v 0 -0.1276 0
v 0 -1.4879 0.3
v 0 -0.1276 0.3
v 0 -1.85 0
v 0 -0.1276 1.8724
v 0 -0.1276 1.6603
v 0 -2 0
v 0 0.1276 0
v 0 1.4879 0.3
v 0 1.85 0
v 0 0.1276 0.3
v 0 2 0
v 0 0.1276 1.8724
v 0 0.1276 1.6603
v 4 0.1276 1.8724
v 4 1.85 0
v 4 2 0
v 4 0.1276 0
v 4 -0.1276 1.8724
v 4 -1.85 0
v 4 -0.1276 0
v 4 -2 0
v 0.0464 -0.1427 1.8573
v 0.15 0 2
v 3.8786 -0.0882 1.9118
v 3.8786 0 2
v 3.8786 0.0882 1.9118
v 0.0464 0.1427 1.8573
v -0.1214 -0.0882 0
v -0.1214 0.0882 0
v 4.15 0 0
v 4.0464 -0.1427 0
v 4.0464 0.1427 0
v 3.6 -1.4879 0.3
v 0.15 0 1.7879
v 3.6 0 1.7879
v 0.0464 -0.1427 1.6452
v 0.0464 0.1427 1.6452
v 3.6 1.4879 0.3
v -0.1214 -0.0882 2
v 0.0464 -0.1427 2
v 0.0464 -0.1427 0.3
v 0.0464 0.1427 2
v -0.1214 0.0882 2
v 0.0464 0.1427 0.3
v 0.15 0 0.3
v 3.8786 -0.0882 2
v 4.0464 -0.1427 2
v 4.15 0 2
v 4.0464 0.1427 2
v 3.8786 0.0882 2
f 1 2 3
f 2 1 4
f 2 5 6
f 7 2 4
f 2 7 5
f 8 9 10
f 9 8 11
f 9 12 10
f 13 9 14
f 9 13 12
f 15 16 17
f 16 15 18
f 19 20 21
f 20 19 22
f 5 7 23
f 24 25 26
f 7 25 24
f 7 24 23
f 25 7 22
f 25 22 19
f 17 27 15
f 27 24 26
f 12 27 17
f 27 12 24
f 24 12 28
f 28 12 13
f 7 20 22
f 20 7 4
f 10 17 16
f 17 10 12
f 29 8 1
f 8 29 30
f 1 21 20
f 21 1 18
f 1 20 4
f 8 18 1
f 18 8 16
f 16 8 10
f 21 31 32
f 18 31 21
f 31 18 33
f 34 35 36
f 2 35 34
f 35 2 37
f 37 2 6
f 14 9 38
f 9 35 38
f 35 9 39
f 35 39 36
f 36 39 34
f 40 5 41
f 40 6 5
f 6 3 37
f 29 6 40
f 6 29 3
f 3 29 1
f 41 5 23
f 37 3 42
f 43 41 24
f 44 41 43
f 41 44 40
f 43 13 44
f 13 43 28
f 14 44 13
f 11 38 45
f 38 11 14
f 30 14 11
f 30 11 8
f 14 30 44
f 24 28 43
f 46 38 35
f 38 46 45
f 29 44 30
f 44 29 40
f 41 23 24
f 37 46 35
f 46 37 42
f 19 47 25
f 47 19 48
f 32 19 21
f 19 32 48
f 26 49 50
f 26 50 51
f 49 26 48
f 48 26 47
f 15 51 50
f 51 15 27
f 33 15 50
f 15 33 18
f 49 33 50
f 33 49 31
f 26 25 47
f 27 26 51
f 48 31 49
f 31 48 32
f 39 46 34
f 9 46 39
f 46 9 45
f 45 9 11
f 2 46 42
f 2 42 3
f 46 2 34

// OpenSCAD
// tents.scad
// OpenSCAD Template
// 
// Copyright (C) 2013 Christopher Roberts
//
// This program is free software: you can redistribute it and/or modify
// it under the terms of the GNU General Public License as published by
// the Free Software Foundation, either version 3 of the License, or
// (at your option) any later version.
// 
// This program is distributed in the hope that it will be useful,
// but WITHOUT ANY WARRANTY; without even the implied warranty of
// MERCHANTABILITY or FITNESS FOR A PARTICULAR PURPOSE.  See the
// GNU General Public License for more details.
// 
// You should have received a copy of the GNU General Public License
// along with this program.  If not, see <http://www.gnu.org/licenses/>.


// Global Parameters
height = 2; // Height of tent pole
length = 4; // Length of tent
layer  = 0.3; // Layer height

module tent_shape( l, h) {

    difference() {

        // Things that exist
        union() {
            translate( v = [ 0, 0, -height ] ) {
                rotate( a = [ 45, 0, 0 ] ) {
                    cube( size = [l, sqrt(0.5 * pow(h*2,2)), sqrt(0.5 * pow(h*2,2)) ] );
                }
            }
        }

        // Things to be cut out
        union() {
            translate( v = [ -0.1, -h, -h] ) {
                cube( size = [ length + 0.2, 2* height, height ] );
            }
        }
    }

}

module tent() {

    difference() {

        // Things that exist
        union() {
            tent_shape(length, height);
        }

        // Things that don't exist
        union() {
            translate( v = [ -0.1, 0, -sqrt( 0.5 * pow(layer,2)) ] ) {
                tent_shape(length -layer, height);
            }
        }
    
    }

}

module tent_complete() {

    difference() {

        // Things that exist
        union() {
            tent();
            cylinder( r = layer/2, h = height );
            translate( v = [ length, 0, 0 ] ) {
                cylinder( r = layer/2, h = height );
            }
            translate( v = [0, -height +layer, 0] ) {
                cube( size = [length, 2 * (height - layer), layer ] );
            }
            translate( v = [0, -height + layer/2, 0] ) {
                cube( size = [length, 2 * height - layer, layer/2 ] );
            }

        }

        // Things that don't exist
        union() {

        }
    
    }

}

tent_complete();

// -------------------------------------------------------------------------------------------
// Commands
// -------------------------------------------------------------------------------------------

// http://en.wikibooks.org/wiki/OpenSCAD_User_Manual

// primitives
// cube(size = [1,2,3], center = true);
// sphere( r = 10, $fn=100 );
// circle( r = 10 );
// cylinder( h = 10, r = 20, $fs = 6, center = true );
// cylinder( h = 10, r1 = 10, r2 = 20, $fs = 6, center = false );
// polyhedron(points = [ [x, y, z], ... ], triangles = [ [p1, p2, p3..], ... ], convexity = N);
// polygon(points = [ [x, y], ... ], paths = [ [p1, p2, p3..], ... ], convexity = N);

// transormations
// scale(v = [x, y, z]) { ... }
// rotate(a=[0,180,0]) { ... }
// translate(v = [x, y, z]) { ... }
// mirror([ 0, 1, 0 ]) { ... }

// rounded box by combining a cube and single cylinder
// $fn=50;
// minkowski() {
//   cube([10,10,1]);
//   cylinder(r=2,h=1);
// }

// hull() {
//   translate([15,10,0]) circle(10);
//   circle(10);
// }

// linear_extrude(height=1, convexity = 1) import("tridentlogo.dxf");
// deprecated - dxf_linear_extrude(file="tridentlogo.dxf", height = 1, center = false, convexity = 10);
// deprecated - import_dxf(file="design.dxf", layer="layername", origin = [100,100], scale = 0.5);
// linear_extrude(height = 10, center = true, convexity = 10, twist = 0, $fn = 100)
// rotate_extrude(convexity = 10, $fn = 100)
// import_stl("example012.stl", convexity = 5);

// for (z = [-1, 1] ) { ... } // two iterations, z = -1, z = 1
// for (z = [ 0 : 5 ] ) { ... } // range of interations step 1
// for (z = [ 0 : 2 : 5 ] ) { ... } // range of interations step 2

// for (i = [ [ 0, 0, 0 ], [...] ] ) { ... } // range of rotations or vectors
// usage say rotate($i) or translate($i)
// if ( x > y ) { ... } else { ... }
// assign (angle = i*360/20, distance = i*10, r = i*2)

// text http://www.thingiverse.com/thing:25036
// inkscape / select all items
// objects to path
// select the object to export
// extensions / generate from path / paths to openscad
